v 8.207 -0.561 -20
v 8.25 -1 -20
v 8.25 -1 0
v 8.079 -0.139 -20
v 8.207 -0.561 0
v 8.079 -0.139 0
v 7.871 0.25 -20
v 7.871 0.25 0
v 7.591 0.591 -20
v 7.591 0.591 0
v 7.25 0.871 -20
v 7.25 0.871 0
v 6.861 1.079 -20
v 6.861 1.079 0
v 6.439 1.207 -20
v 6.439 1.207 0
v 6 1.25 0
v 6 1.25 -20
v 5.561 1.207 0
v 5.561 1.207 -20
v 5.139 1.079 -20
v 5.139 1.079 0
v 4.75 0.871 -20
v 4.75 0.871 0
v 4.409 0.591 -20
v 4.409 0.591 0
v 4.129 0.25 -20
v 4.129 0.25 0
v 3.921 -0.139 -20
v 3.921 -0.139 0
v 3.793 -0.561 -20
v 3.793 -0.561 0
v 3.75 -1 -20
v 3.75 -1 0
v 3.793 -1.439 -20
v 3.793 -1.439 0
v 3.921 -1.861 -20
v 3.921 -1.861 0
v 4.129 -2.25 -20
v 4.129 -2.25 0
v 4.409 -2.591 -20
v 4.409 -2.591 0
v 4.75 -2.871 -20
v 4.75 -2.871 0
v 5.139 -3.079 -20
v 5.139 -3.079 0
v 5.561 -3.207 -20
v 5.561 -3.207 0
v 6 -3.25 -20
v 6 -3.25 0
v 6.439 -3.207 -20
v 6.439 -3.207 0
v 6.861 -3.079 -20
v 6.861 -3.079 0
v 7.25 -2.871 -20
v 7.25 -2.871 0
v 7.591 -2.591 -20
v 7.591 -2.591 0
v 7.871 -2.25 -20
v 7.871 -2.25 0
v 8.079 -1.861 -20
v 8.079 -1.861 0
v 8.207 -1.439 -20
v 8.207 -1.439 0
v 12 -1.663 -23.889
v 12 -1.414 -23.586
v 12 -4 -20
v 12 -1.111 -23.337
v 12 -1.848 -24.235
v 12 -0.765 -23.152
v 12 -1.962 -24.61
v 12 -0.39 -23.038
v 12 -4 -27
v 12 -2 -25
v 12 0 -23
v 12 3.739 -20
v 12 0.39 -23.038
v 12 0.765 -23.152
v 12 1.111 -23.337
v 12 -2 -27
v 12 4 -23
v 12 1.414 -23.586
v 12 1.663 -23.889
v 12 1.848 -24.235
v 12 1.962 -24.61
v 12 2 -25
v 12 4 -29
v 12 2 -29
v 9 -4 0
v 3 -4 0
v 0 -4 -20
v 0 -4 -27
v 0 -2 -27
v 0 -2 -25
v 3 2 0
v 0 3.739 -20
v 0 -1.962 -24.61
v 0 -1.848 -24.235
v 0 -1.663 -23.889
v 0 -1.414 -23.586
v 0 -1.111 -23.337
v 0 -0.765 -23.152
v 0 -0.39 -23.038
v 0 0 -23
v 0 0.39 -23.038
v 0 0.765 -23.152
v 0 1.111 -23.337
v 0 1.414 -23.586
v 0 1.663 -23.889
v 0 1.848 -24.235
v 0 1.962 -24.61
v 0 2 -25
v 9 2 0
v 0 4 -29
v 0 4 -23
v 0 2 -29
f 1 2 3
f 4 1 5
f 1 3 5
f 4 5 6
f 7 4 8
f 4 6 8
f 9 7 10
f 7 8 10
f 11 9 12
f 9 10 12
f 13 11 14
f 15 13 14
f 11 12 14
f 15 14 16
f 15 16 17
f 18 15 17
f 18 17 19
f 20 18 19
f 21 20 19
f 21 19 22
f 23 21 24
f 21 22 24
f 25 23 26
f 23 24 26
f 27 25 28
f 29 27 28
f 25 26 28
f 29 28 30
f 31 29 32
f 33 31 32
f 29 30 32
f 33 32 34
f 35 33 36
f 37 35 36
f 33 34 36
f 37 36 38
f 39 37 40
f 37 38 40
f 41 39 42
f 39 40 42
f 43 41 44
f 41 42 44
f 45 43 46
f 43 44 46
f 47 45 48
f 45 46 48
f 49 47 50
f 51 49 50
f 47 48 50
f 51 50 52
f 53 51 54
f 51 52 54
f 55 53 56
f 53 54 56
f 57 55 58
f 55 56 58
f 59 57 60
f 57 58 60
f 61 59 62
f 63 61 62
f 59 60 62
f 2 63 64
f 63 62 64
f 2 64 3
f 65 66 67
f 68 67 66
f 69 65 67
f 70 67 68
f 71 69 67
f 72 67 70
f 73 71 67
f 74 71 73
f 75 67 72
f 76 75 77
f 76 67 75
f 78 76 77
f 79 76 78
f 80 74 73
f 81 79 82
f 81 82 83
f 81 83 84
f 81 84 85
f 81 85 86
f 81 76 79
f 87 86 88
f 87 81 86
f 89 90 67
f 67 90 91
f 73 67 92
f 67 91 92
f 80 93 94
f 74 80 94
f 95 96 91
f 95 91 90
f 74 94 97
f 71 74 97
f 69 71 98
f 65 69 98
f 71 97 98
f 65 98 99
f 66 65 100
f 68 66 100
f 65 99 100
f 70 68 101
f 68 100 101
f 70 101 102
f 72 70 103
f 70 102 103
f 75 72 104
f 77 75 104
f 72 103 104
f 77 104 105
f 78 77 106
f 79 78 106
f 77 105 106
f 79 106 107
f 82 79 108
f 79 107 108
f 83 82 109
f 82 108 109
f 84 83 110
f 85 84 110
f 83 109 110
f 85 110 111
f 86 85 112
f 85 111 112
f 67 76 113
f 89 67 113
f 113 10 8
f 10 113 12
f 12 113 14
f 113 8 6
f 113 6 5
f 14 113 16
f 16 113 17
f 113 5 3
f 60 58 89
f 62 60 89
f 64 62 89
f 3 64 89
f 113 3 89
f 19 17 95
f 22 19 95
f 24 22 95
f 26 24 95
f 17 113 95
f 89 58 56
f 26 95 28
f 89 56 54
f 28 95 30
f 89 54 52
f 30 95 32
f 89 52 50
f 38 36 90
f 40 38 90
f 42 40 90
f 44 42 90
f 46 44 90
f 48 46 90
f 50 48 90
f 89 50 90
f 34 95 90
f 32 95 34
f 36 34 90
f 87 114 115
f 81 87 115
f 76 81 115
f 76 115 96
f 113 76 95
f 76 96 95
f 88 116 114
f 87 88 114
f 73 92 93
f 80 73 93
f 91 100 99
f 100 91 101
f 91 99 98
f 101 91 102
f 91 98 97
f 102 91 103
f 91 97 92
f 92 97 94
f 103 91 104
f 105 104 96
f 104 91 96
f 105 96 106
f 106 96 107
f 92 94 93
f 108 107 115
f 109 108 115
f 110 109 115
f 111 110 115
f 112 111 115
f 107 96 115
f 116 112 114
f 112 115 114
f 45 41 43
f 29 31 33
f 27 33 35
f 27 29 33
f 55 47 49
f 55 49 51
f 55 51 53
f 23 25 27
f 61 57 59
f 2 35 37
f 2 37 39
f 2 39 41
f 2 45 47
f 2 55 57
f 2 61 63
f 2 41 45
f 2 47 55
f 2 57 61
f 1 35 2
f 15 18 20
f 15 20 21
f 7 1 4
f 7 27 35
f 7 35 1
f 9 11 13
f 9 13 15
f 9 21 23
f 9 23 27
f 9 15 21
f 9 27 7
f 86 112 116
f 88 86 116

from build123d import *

# Parameters (mm, degrees)
EXTRUDE_1_DEPTH     = 12
CUT_EXTRUDE_1_DEPTH = 9
SKETCH_3_R          = 2.25
CUT_EXTRUDE_2_DEPTH = 20


with BuildPart() as part:
    # Эскиз1 → Бобышка-Вытянуть1 (new body)
    with BuildSketch(Plane(origin=(0, 0, 0), x_dir=(0, 0, -1), z_dir=(1, 0, 0))):
        with BuildLine():
            Line((0, 2), (0, -4))
            Line((0, -4), (27, -4))
            Line((27, -4), (27, -2))
            Line((27, -2), (25, -2))
            ThreePointArc((25, -2), (23, 0), (25, 2))
            Line((25, 2), (29, 2))
            Line((29, 2), (29, 4))
            Line((29, 4), (23, 4))
            Line((23, 4), (0, 2))
        make_face()
    extrude(amount=EXTRUDE_1_DEPTH)

    # Эскиз2 → Вырез-Вытянуть1 (cut, through all)
    with BuildSketch(Plane(origin=(0, 4, 0), x_dir=(1, 0, 0), z_dir=(0, 1, 0))):
        Polygon((0, 0), (0, 20), (3, 0), align=None)
        Polygon((12, 20), (9, 0), (12, 0), align=None)
    extrude(amount=-CUT_EXTRUDE_1_DEPTH, mode=Mode.SUBTRACT)

    # Эскиз3 → Вырез-Вытянуть2 (cut)
    with BuildSketch(Plane.XY):
        with Locations((6, -1)):
            Circle(SKETCH_3_R)
    extrude(amount=-CUT_EXTRUDE_2_DEPTH, mode=Mode.SUBTRACT)


solid = part.part
